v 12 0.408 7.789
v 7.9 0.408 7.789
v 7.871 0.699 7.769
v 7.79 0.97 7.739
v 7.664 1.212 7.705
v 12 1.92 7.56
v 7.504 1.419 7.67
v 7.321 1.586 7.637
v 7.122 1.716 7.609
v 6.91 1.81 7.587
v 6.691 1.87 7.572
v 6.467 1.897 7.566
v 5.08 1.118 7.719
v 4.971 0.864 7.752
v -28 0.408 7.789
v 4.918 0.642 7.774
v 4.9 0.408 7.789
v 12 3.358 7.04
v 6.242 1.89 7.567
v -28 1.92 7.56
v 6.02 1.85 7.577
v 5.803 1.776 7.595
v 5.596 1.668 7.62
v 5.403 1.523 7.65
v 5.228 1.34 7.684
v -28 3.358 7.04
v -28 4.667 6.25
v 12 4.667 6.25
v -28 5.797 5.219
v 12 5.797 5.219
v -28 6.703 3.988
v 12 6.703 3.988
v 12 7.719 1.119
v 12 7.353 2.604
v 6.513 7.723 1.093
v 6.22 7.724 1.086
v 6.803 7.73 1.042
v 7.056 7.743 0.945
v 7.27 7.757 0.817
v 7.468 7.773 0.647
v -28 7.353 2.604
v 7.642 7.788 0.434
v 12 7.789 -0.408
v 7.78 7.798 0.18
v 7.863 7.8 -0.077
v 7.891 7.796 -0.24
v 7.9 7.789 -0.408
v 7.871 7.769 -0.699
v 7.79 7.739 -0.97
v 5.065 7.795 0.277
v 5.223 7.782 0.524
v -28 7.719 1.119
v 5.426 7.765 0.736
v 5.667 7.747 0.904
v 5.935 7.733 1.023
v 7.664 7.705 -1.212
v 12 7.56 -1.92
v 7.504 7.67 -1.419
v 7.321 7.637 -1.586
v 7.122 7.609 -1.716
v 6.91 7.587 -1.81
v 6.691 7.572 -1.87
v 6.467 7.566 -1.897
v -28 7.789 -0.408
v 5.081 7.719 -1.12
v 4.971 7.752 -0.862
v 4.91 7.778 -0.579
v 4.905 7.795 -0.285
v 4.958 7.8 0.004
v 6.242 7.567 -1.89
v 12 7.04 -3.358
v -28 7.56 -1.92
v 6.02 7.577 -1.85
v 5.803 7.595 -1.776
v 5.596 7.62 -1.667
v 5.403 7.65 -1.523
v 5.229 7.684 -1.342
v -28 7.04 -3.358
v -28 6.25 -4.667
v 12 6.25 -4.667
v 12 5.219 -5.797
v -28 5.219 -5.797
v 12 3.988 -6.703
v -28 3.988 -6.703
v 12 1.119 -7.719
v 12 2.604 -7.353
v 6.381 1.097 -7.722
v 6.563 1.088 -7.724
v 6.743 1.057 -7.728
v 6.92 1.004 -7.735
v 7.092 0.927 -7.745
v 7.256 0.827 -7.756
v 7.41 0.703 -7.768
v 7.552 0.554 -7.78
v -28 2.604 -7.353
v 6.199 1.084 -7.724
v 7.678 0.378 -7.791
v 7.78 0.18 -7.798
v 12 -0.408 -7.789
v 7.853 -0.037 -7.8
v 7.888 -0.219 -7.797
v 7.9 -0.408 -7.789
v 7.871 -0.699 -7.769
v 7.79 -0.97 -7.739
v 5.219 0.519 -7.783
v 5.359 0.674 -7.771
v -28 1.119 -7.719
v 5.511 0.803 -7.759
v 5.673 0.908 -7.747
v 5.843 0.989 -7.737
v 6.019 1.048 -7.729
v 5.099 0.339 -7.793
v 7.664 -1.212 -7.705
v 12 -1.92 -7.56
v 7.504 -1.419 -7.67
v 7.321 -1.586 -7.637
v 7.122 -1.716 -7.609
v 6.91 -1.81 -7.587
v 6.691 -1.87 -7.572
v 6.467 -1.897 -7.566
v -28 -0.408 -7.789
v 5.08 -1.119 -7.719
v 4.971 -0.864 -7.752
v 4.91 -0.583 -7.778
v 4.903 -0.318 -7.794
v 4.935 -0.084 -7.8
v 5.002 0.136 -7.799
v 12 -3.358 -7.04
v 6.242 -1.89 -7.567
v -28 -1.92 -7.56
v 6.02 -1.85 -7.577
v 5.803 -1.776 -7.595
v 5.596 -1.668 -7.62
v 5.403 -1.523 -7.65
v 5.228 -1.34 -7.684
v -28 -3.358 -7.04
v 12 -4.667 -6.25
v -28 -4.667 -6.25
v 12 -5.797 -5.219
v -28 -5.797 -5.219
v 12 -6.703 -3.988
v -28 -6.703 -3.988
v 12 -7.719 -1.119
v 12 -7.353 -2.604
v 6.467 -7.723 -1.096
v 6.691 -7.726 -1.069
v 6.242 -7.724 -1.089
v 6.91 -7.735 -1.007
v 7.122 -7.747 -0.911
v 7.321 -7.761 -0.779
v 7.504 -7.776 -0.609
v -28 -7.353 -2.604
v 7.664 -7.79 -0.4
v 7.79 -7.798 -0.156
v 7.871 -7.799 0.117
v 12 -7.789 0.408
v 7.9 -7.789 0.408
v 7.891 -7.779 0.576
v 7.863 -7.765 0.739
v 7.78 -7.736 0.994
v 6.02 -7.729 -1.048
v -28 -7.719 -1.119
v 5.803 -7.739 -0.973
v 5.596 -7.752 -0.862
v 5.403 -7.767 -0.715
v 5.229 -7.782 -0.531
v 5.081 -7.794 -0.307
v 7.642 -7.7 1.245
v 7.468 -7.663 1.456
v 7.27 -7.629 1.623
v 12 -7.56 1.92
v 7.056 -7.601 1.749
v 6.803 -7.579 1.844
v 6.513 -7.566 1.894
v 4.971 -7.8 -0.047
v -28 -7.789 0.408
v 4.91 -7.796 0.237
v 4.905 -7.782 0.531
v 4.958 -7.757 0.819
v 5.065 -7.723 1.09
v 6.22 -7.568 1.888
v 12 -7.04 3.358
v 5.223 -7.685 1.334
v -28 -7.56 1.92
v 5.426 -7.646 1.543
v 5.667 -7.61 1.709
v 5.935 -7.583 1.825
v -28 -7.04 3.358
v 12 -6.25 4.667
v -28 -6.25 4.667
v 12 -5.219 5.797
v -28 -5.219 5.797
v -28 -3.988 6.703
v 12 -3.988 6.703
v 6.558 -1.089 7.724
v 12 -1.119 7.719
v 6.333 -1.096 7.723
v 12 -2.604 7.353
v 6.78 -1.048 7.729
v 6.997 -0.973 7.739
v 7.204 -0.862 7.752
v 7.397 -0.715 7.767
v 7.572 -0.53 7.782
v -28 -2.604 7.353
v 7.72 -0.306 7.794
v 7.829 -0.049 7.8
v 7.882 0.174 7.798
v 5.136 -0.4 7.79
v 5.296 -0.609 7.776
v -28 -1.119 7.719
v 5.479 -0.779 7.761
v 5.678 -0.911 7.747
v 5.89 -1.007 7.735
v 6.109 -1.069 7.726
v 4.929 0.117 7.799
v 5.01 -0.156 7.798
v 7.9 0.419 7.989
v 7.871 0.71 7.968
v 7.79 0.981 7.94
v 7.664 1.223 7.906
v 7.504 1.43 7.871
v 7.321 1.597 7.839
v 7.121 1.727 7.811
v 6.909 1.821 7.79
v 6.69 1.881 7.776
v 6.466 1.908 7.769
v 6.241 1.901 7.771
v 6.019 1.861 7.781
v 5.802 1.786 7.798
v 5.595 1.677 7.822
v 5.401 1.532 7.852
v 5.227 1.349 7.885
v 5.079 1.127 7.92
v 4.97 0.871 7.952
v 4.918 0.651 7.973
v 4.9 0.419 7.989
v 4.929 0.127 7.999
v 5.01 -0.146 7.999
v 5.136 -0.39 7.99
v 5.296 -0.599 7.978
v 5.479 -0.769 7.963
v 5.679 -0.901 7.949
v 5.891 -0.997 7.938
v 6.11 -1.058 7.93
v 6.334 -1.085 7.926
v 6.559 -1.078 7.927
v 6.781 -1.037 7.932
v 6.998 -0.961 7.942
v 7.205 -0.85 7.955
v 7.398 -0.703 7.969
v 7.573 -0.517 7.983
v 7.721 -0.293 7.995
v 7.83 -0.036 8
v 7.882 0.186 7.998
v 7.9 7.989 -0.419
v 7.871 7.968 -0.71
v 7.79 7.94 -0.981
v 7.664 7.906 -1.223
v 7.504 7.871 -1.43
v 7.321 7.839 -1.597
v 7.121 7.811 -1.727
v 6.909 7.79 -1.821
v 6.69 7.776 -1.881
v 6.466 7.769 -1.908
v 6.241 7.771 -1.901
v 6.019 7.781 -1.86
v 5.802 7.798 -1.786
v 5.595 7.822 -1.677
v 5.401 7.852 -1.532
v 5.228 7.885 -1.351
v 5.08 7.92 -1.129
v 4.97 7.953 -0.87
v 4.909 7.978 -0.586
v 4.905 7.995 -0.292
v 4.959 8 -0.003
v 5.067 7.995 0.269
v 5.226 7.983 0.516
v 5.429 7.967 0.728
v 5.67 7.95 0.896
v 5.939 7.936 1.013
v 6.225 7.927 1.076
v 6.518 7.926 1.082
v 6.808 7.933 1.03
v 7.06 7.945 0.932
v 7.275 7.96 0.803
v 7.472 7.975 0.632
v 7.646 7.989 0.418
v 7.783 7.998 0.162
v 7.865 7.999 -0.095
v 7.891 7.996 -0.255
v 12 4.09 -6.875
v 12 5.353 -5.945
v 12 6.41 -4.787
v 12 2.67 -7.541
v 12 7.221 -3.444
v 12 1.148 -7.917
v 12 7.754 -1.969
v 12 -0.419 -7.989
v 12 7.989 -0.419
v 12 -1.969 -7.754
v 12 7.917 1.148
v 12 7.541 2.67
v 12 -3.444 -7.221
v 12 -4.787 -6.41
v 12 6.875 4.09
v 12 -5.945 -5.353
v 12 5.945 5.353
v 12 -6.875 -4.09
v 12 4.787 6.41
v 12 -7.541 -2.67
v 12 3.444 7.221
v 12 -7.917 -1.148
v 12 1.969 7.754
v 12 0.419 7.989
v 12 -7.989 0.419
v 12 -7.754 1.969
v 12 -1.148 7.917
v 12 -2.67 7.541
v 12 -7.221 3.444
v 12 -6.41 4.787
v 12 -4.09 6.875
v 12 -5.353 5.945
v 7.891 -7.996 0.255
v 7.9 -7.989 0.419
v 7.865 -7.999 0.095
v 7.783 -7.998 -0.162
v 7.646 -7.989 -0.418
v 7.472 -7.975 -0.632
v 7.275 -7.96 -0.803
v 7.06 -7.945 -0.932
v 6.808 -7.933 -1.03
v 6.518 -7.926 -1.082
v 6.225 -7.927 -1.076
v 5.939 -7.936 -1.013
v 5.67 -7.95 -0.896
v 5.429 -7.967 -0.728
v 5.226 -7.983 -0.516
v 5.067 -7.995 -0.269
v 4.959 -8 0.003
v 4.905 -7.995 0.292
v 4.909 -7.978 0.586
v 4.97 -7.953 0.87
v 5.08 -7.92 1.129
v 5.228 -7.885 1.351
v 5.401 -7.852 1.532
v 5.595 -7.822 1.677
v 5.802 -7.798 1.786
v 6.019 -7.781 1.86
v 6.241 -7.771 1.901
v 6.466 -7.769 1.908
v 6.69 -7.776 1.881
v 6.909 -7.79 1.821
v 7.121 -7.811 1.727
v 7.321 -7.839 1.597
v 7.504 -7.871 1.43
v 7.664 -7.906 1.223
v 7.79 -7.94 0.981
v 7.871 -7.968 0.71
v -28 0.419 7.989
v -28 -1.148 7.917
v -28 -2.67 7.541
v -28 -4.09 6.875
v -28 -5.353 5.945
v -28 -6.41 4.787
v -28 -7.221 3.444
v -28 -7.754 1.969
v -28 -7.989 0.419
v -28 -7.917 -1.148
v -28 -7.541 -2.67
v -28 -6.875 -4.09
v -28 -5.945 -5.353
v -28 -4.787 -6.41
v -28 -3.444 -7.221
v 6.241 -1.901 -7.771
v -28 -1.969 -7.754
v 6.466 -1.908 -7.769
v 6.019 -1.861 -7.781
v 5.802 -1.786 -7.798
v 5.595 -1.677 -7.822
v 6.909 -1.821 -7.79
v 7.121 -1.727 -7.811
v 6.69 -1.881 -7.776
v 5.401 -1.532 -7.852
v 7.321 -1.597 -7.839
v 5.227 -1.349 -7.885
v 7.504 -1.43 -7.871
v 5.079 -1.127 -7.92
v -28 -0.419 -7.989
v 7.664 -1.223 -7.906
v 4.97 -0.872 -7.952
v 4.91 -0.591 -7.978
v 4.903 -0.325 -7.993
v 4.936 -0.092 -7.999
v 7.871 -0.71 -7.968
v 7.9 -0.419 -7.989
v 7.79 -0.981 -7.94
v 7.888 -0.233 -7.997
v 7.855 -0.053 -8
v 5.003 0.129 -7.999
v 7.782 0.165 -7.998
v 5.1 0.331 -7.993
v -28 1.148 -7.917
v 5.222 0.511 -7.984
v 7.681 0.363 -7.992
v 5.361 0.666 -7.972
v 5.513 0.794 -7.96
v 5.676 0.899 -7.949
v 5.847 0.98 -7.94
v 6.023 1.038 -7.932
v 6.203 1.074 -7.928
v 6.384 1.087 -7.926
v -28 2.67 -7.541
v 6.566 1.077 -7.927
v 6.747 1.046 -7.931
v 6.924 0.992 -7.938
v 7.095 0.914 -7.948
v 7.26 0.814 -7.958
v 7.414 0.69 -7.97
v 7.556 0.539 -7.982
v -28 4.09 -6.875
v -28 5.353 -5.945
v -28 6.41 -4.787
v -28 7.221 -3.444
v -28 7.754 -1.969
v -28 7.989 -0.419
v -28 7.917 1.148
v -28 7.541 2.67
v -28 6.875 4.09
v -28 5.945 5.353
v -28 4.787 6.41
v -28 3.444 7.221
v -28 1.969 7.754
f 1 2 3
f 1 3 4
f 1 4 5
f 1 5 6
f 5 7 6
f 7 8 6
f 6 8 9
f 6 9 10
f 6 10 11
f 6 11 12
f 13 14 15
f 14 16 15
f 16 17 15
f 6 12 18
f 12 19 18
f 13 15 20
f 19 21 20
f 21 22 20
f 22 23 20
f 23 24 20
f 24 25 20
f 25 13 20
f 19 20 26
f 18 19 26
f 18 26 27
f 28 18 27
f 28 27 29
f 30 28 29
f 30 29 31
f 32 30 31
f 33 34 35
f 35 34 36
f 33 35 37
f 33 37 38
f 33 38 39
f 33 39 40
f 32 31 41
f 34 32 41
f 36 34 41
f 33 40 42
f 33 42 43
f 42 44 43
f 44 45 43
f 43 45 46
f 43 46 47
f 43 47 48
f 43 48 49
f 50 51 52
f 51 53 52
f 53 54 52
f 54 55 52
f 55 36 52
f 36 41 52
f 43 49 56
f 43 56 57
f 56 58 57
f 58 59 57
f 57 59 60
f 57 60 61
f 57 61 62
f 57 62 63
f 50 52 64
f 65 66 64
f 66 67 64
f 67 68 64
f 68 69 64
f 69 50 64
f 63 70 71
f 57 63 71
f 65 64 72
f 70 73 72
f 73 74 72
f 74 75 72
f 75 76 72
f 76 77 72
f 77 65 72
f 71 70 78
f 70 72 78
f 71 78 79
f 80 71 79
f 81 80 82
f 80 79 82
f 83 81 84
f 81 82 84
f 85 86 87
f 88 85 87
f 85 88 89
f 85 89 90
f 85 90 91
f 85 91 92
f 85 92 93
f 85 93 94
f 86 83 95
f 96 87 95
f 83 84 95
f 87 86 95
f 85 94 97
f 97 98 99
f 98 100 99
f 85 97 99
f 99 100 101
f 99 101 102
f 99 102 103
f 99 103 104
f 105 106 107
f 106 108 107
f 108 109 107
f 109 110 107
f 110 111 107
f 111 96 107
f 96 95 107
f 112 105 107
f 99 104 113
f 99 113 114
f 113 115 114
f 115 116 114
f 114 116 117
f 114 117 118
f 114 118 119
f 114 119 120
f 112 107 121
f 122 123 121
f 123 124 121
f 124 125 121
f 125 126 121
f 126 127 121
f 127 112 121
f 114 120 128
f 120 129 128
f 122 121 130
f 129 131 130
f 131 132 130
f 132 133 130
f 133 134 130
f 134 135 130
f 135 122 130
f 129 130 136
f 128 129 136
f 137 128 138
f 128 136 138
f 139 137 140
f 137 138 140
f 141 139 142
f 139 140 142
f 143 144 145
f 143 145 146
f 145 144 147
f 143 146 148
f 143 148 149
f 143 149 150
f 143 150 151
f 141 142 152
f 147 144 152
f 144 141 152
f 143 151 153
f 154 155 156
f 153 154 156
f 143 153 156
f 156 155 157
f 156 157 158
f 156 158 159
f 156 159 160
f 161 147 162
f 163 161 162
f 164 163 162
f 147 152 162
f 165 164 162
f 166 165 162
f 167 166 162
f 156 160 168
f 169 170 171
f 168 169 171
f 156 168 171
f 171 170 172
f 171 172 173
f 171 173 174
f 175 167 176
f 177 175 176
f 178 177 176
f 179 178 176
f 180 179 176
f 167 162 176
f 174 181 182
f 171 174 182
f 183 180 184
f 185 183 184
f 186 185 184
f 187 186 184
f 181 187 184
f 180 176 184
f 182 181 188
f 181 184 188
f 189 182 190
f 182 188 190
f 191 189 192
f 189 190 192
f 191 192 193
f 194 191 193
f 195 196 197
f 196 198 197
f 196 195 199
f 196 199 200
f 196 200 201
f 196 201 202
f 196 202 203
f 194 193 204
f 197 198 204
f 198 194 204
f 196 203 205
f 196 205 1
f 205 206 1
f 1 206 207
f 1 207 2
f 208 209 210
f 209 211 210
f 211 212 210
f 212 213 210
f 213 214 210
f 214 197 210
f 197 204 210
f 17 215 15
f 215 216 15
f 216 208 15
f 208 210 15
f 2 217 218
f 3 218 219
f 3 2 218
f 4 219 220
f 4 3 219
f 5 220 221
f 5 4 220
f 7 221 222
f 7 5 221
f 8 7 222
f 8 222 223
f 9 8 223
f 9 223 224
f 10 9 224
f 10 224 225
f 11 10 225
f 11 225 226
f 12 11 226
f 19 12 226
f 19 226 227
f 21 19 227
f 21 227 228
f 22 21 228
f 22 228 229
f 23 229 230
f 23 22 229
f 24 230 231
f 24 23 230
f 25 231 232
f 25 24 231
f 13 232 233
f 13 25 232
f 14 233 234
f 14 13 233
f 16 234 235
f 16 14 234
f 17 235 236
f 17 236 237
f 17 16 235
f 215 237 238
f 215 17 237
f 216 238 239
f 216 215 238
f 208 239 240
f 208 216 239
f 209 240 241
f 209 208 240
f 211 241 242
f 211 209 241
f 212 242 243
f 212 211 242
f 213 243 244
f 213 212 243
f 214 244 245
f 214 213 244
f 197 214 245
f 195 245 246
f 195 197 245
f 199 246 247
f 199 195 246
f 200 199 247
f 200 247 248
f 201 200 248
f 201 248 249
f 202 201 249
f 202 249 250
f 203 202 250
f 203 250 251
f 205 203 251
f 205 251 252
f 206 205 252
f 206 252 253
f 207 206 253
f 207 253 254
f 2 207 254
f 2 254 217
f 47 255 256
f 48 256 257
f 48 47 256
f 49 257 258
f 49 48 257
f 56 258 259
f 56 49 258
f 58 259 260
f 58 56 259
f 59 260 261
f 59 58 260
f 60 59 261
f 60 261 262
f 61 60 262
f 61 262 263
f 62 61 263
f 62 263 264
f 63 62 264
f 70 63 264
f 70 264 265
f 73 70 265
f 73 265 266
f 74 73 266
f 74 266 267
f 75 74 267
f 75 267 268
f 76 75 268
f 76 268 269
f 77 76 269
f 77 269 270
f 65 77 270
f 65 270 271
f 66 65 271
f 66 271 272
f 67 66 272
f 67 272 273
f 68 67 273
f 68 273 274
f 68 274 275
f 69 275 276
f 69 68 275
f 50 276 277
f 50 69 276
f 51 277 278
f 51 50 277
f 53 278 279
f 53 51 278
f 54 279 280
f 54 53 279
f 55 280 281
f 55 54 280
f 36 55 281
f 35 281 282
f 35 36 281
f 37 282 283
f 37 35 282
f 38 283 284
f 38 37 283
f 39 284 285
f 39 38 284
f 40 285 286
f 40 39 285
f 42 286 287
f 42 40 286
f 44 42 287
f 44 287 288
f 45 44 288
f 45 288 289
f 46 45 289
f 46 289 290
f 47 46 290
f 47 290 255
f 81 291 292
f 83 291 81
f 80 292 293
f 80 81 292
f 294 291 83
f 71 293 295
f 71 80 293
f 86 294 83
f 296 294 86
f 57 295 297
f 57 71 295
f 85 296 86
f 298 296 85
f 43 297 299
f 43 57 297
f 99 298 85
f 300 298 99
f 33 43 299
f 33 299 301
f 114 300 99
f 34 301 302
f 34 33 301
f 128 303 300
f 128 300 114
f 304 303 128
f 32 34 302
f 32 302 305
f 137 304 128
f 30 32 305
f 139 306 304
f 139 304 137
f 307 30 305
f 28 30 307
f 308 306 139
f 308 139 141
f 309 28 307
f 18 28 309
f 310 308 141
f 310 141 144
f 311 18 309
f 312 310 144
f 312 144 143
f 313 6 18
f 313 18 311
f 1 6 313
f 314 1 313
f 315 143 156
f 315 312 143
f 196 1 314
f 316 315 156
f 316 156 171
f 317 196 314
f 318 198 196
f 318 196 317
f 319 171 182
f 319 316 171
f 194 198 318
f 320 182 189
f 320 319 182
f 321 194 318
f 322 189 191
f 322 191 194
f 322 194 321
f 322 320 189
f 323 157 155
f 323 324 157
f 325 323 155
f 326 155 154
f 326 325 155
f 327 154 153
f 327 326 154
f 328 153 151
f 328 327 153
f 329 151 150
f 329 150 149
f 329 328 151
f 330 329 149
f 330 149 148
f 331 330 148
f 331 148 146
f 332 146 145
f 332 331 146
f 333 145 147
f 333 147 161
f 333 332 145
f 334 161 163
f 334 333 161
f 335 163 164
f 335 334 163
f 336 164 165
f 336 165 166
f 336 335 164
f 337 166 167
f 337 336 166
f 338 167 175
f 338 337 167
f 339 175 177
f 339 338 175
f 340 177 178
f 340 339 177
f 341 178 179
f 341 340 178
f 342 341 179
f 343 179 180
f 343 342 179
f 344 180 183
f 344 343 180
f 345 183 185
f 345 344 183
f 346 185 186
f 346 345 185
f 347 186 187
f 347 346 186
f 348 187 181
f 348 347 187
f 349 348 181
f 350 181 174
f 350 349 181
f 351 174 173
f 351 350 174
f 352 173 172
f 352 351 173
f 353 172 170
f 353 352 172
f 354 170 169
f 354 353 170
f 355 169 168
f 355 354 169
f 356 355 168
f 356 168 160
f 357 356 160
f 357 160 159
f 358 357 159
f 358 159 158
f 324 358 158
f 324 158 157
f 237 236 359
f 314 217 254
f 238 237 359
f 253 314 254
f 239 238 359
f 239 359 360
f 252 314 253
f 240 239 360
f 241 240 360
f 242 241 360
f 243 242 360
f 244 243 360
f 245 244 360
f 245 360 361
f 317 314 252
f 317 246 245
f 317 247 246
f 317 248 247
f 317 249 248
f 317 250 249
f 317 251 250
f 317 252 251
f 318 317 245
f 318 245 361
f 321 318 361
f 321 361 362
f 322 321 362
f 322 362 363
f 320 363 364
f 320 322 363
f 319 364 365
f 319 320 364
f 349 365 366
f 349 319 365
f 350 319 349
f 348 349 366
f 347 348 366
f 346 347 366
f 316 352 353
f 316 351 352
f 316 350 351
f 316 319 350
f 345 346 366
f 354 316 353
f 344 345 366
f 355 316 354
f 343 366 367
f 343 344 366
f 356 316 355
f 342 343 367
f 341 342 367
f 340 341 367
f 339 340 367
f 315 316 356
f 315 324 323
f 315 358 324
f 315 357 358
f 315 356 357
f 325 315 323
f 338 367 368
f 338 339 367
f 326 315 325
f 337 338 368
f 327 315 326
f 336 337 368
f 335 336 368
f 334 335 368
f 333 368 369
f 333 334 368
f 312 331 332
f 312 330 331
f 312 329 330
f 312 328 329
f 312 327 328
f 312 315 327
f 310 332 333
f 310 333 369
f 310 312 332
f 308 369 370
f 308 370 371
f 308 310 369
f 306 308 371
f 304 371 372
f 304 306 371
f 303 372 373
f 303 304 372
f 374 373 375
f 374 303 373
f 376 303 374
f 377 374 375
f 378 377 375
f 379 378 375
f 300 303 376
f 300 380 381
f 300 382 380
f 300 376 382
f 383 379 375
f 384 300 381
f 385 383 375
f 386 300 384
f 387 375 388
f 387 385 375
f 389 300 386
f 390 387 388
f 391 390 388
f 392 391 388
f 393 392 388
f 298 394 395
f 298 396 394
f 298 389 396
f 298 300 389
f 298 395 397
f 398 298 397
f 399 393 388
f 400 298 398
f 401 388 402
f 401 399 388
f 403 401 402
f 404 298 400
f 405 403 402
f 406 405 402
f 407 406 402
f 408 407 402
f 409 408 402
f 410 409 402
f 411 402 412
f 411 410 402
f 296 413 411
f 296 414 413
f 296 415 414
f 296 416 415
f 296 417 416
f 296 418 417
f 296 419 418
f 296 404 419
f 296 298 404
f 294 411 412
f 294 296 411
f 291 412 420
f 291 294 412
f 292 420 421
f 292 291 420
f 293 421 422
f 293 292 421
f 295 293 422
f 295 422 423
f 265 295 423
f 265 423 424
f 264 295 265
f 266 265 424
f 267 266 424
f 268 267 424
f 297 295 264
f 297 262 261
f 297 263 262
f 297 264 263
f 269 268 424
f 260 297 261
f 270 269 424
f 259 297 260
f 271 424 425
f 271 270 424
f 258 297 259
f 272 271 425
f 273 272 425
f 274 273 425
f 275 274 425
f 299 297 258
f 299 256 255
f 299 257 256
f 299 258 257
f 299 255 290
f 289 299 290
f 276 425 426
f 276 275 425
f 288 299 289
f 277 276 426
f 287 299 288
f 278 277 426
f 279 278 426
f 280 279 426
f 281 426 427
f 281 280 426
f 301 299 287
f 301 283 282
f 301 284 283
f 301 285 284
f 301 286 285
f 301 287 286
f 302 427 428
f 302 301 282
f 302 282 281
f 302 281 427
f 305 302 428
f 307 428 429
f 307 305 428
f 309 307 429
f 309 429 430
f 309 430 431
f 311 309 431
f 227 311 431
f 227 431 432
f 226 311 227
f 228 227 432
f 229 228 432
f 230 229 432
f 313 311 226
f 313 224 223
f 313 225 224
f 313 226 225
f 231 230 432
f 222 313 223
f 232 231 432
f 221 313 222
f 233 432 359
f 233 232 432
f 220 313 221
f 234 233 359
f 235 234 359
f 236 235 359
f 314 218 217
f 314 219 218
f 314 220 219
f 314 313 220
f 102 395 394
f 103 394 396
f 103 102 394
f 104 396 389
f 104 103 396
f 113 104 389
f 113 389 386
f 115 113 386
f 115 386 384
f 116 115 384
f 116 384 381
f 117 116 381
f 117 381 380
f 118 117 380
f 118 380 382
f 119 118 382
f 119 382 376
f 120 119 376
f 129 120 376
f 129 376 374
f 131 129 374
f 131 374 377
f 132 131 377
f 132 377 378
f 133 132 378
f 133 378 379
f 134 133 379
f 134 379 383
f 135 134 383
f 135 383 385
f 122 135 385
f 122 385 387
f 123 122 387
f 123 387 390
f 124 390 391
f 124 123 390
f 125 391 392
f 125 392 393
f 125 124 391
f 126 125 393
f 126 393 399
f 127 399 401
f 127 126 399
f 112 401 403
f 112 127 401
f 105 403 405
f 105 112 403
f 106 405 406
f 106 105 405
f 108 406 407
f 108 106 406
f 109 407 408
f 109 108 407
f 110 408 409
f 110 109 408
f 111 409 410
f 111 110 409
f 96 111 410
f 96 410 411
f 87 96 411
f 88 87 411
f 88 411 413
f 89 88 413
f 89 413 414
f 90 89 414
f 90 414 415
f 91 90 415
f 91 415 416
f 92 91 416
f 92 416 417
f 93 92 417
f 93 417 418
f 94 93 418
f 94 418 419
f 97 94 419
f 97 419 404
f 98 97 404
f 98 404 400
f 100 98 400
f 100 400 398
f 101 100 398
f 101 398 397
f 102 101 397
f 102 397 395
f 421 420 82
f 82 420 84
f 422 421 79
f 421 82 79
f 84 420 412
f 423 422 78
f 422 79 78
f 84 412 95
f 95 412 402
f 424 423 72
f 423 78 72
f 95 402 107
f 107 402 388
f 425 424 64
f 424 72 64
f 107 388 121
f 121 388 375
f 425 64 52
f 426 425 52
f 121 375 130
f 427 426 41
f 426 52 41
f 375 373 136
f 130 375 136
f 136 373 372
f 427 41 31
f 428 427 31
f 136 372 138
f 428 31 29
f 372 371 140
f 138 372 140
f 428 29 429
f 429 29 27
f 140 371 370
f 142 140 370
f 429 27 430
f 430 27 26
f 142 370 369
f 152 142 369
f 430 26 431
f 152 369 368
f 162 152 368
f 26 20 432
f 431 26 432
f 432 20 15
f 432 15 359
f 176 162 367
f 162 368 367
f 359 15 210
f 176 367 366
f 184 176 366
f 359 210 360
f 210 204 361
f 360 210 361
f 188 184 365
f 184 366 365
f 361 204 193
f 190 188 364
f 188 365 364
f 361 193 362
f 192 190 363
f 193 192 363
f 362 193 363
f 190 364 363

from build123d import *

# Parameters (mm, degrees)
SKETCH014_R             = 8
PAD006_DEPTH            = 40
SKETCH015_R             = 1.5
POCKET008_DEPTH         = 11
POLARPATTERN002_COUNT   = 4
SKETCH016_R             = 7.8
POCKET009_DEPTH         = 40.001
BODY004_PLACEMENT_ANGLE = 87


with BuildPart() as part:
    # Sketch014 → Pad006 (new body)
    with BuildSketch(Plane.YZ.offset(10)):
        Circle(SKETCH014_R)
    extrude(amount=-PAD006_DEPTH)

    # Sketch015 → Pocket008 (cut)
    with BuildSketch(Plane.XY):
        with Locations((4.4, 0)):
            Circle(SKETCH015_R)
    pocket008 = extrude(amount=POCKET008_DEPTH, mode=Mode.SUBTRACT)

    # PolarPattern002: Pocket008 ×4 about axis
    polarpattern002_axis = Axis((0, 0, 0), (1, 0, 0))
    for i in range(1, POLARPATTERN002_COUNT):
        add(pocket008.rotate(polarpattern002_axis, i * 360 / POLARPATTERN002_COUNT), mode=Mode.SUBTRACT)

    # Sketch016 (on Face3 of Pad006) → Pocket009 (cut, through all)
    with BuildSketch(Plane(origin=(-30, 0, 0), x_dir=(0, 1, 0), z_dir=(-1, 0, 0))):
        Circle(SKETCH016_R)
    extrude(amount=-POCKET009_DEPTH, mode=Mode.SUBTRACT)


with BuildPart() as part_1:
    # Body004 placement: moved
    add(part.part.moved(Location((2, 0, 0))).rotate(Axis((2, 0, 0), (1, 0, 0)), BODY004_PLACEMENT_ANGLE))


solid = part_1.part
